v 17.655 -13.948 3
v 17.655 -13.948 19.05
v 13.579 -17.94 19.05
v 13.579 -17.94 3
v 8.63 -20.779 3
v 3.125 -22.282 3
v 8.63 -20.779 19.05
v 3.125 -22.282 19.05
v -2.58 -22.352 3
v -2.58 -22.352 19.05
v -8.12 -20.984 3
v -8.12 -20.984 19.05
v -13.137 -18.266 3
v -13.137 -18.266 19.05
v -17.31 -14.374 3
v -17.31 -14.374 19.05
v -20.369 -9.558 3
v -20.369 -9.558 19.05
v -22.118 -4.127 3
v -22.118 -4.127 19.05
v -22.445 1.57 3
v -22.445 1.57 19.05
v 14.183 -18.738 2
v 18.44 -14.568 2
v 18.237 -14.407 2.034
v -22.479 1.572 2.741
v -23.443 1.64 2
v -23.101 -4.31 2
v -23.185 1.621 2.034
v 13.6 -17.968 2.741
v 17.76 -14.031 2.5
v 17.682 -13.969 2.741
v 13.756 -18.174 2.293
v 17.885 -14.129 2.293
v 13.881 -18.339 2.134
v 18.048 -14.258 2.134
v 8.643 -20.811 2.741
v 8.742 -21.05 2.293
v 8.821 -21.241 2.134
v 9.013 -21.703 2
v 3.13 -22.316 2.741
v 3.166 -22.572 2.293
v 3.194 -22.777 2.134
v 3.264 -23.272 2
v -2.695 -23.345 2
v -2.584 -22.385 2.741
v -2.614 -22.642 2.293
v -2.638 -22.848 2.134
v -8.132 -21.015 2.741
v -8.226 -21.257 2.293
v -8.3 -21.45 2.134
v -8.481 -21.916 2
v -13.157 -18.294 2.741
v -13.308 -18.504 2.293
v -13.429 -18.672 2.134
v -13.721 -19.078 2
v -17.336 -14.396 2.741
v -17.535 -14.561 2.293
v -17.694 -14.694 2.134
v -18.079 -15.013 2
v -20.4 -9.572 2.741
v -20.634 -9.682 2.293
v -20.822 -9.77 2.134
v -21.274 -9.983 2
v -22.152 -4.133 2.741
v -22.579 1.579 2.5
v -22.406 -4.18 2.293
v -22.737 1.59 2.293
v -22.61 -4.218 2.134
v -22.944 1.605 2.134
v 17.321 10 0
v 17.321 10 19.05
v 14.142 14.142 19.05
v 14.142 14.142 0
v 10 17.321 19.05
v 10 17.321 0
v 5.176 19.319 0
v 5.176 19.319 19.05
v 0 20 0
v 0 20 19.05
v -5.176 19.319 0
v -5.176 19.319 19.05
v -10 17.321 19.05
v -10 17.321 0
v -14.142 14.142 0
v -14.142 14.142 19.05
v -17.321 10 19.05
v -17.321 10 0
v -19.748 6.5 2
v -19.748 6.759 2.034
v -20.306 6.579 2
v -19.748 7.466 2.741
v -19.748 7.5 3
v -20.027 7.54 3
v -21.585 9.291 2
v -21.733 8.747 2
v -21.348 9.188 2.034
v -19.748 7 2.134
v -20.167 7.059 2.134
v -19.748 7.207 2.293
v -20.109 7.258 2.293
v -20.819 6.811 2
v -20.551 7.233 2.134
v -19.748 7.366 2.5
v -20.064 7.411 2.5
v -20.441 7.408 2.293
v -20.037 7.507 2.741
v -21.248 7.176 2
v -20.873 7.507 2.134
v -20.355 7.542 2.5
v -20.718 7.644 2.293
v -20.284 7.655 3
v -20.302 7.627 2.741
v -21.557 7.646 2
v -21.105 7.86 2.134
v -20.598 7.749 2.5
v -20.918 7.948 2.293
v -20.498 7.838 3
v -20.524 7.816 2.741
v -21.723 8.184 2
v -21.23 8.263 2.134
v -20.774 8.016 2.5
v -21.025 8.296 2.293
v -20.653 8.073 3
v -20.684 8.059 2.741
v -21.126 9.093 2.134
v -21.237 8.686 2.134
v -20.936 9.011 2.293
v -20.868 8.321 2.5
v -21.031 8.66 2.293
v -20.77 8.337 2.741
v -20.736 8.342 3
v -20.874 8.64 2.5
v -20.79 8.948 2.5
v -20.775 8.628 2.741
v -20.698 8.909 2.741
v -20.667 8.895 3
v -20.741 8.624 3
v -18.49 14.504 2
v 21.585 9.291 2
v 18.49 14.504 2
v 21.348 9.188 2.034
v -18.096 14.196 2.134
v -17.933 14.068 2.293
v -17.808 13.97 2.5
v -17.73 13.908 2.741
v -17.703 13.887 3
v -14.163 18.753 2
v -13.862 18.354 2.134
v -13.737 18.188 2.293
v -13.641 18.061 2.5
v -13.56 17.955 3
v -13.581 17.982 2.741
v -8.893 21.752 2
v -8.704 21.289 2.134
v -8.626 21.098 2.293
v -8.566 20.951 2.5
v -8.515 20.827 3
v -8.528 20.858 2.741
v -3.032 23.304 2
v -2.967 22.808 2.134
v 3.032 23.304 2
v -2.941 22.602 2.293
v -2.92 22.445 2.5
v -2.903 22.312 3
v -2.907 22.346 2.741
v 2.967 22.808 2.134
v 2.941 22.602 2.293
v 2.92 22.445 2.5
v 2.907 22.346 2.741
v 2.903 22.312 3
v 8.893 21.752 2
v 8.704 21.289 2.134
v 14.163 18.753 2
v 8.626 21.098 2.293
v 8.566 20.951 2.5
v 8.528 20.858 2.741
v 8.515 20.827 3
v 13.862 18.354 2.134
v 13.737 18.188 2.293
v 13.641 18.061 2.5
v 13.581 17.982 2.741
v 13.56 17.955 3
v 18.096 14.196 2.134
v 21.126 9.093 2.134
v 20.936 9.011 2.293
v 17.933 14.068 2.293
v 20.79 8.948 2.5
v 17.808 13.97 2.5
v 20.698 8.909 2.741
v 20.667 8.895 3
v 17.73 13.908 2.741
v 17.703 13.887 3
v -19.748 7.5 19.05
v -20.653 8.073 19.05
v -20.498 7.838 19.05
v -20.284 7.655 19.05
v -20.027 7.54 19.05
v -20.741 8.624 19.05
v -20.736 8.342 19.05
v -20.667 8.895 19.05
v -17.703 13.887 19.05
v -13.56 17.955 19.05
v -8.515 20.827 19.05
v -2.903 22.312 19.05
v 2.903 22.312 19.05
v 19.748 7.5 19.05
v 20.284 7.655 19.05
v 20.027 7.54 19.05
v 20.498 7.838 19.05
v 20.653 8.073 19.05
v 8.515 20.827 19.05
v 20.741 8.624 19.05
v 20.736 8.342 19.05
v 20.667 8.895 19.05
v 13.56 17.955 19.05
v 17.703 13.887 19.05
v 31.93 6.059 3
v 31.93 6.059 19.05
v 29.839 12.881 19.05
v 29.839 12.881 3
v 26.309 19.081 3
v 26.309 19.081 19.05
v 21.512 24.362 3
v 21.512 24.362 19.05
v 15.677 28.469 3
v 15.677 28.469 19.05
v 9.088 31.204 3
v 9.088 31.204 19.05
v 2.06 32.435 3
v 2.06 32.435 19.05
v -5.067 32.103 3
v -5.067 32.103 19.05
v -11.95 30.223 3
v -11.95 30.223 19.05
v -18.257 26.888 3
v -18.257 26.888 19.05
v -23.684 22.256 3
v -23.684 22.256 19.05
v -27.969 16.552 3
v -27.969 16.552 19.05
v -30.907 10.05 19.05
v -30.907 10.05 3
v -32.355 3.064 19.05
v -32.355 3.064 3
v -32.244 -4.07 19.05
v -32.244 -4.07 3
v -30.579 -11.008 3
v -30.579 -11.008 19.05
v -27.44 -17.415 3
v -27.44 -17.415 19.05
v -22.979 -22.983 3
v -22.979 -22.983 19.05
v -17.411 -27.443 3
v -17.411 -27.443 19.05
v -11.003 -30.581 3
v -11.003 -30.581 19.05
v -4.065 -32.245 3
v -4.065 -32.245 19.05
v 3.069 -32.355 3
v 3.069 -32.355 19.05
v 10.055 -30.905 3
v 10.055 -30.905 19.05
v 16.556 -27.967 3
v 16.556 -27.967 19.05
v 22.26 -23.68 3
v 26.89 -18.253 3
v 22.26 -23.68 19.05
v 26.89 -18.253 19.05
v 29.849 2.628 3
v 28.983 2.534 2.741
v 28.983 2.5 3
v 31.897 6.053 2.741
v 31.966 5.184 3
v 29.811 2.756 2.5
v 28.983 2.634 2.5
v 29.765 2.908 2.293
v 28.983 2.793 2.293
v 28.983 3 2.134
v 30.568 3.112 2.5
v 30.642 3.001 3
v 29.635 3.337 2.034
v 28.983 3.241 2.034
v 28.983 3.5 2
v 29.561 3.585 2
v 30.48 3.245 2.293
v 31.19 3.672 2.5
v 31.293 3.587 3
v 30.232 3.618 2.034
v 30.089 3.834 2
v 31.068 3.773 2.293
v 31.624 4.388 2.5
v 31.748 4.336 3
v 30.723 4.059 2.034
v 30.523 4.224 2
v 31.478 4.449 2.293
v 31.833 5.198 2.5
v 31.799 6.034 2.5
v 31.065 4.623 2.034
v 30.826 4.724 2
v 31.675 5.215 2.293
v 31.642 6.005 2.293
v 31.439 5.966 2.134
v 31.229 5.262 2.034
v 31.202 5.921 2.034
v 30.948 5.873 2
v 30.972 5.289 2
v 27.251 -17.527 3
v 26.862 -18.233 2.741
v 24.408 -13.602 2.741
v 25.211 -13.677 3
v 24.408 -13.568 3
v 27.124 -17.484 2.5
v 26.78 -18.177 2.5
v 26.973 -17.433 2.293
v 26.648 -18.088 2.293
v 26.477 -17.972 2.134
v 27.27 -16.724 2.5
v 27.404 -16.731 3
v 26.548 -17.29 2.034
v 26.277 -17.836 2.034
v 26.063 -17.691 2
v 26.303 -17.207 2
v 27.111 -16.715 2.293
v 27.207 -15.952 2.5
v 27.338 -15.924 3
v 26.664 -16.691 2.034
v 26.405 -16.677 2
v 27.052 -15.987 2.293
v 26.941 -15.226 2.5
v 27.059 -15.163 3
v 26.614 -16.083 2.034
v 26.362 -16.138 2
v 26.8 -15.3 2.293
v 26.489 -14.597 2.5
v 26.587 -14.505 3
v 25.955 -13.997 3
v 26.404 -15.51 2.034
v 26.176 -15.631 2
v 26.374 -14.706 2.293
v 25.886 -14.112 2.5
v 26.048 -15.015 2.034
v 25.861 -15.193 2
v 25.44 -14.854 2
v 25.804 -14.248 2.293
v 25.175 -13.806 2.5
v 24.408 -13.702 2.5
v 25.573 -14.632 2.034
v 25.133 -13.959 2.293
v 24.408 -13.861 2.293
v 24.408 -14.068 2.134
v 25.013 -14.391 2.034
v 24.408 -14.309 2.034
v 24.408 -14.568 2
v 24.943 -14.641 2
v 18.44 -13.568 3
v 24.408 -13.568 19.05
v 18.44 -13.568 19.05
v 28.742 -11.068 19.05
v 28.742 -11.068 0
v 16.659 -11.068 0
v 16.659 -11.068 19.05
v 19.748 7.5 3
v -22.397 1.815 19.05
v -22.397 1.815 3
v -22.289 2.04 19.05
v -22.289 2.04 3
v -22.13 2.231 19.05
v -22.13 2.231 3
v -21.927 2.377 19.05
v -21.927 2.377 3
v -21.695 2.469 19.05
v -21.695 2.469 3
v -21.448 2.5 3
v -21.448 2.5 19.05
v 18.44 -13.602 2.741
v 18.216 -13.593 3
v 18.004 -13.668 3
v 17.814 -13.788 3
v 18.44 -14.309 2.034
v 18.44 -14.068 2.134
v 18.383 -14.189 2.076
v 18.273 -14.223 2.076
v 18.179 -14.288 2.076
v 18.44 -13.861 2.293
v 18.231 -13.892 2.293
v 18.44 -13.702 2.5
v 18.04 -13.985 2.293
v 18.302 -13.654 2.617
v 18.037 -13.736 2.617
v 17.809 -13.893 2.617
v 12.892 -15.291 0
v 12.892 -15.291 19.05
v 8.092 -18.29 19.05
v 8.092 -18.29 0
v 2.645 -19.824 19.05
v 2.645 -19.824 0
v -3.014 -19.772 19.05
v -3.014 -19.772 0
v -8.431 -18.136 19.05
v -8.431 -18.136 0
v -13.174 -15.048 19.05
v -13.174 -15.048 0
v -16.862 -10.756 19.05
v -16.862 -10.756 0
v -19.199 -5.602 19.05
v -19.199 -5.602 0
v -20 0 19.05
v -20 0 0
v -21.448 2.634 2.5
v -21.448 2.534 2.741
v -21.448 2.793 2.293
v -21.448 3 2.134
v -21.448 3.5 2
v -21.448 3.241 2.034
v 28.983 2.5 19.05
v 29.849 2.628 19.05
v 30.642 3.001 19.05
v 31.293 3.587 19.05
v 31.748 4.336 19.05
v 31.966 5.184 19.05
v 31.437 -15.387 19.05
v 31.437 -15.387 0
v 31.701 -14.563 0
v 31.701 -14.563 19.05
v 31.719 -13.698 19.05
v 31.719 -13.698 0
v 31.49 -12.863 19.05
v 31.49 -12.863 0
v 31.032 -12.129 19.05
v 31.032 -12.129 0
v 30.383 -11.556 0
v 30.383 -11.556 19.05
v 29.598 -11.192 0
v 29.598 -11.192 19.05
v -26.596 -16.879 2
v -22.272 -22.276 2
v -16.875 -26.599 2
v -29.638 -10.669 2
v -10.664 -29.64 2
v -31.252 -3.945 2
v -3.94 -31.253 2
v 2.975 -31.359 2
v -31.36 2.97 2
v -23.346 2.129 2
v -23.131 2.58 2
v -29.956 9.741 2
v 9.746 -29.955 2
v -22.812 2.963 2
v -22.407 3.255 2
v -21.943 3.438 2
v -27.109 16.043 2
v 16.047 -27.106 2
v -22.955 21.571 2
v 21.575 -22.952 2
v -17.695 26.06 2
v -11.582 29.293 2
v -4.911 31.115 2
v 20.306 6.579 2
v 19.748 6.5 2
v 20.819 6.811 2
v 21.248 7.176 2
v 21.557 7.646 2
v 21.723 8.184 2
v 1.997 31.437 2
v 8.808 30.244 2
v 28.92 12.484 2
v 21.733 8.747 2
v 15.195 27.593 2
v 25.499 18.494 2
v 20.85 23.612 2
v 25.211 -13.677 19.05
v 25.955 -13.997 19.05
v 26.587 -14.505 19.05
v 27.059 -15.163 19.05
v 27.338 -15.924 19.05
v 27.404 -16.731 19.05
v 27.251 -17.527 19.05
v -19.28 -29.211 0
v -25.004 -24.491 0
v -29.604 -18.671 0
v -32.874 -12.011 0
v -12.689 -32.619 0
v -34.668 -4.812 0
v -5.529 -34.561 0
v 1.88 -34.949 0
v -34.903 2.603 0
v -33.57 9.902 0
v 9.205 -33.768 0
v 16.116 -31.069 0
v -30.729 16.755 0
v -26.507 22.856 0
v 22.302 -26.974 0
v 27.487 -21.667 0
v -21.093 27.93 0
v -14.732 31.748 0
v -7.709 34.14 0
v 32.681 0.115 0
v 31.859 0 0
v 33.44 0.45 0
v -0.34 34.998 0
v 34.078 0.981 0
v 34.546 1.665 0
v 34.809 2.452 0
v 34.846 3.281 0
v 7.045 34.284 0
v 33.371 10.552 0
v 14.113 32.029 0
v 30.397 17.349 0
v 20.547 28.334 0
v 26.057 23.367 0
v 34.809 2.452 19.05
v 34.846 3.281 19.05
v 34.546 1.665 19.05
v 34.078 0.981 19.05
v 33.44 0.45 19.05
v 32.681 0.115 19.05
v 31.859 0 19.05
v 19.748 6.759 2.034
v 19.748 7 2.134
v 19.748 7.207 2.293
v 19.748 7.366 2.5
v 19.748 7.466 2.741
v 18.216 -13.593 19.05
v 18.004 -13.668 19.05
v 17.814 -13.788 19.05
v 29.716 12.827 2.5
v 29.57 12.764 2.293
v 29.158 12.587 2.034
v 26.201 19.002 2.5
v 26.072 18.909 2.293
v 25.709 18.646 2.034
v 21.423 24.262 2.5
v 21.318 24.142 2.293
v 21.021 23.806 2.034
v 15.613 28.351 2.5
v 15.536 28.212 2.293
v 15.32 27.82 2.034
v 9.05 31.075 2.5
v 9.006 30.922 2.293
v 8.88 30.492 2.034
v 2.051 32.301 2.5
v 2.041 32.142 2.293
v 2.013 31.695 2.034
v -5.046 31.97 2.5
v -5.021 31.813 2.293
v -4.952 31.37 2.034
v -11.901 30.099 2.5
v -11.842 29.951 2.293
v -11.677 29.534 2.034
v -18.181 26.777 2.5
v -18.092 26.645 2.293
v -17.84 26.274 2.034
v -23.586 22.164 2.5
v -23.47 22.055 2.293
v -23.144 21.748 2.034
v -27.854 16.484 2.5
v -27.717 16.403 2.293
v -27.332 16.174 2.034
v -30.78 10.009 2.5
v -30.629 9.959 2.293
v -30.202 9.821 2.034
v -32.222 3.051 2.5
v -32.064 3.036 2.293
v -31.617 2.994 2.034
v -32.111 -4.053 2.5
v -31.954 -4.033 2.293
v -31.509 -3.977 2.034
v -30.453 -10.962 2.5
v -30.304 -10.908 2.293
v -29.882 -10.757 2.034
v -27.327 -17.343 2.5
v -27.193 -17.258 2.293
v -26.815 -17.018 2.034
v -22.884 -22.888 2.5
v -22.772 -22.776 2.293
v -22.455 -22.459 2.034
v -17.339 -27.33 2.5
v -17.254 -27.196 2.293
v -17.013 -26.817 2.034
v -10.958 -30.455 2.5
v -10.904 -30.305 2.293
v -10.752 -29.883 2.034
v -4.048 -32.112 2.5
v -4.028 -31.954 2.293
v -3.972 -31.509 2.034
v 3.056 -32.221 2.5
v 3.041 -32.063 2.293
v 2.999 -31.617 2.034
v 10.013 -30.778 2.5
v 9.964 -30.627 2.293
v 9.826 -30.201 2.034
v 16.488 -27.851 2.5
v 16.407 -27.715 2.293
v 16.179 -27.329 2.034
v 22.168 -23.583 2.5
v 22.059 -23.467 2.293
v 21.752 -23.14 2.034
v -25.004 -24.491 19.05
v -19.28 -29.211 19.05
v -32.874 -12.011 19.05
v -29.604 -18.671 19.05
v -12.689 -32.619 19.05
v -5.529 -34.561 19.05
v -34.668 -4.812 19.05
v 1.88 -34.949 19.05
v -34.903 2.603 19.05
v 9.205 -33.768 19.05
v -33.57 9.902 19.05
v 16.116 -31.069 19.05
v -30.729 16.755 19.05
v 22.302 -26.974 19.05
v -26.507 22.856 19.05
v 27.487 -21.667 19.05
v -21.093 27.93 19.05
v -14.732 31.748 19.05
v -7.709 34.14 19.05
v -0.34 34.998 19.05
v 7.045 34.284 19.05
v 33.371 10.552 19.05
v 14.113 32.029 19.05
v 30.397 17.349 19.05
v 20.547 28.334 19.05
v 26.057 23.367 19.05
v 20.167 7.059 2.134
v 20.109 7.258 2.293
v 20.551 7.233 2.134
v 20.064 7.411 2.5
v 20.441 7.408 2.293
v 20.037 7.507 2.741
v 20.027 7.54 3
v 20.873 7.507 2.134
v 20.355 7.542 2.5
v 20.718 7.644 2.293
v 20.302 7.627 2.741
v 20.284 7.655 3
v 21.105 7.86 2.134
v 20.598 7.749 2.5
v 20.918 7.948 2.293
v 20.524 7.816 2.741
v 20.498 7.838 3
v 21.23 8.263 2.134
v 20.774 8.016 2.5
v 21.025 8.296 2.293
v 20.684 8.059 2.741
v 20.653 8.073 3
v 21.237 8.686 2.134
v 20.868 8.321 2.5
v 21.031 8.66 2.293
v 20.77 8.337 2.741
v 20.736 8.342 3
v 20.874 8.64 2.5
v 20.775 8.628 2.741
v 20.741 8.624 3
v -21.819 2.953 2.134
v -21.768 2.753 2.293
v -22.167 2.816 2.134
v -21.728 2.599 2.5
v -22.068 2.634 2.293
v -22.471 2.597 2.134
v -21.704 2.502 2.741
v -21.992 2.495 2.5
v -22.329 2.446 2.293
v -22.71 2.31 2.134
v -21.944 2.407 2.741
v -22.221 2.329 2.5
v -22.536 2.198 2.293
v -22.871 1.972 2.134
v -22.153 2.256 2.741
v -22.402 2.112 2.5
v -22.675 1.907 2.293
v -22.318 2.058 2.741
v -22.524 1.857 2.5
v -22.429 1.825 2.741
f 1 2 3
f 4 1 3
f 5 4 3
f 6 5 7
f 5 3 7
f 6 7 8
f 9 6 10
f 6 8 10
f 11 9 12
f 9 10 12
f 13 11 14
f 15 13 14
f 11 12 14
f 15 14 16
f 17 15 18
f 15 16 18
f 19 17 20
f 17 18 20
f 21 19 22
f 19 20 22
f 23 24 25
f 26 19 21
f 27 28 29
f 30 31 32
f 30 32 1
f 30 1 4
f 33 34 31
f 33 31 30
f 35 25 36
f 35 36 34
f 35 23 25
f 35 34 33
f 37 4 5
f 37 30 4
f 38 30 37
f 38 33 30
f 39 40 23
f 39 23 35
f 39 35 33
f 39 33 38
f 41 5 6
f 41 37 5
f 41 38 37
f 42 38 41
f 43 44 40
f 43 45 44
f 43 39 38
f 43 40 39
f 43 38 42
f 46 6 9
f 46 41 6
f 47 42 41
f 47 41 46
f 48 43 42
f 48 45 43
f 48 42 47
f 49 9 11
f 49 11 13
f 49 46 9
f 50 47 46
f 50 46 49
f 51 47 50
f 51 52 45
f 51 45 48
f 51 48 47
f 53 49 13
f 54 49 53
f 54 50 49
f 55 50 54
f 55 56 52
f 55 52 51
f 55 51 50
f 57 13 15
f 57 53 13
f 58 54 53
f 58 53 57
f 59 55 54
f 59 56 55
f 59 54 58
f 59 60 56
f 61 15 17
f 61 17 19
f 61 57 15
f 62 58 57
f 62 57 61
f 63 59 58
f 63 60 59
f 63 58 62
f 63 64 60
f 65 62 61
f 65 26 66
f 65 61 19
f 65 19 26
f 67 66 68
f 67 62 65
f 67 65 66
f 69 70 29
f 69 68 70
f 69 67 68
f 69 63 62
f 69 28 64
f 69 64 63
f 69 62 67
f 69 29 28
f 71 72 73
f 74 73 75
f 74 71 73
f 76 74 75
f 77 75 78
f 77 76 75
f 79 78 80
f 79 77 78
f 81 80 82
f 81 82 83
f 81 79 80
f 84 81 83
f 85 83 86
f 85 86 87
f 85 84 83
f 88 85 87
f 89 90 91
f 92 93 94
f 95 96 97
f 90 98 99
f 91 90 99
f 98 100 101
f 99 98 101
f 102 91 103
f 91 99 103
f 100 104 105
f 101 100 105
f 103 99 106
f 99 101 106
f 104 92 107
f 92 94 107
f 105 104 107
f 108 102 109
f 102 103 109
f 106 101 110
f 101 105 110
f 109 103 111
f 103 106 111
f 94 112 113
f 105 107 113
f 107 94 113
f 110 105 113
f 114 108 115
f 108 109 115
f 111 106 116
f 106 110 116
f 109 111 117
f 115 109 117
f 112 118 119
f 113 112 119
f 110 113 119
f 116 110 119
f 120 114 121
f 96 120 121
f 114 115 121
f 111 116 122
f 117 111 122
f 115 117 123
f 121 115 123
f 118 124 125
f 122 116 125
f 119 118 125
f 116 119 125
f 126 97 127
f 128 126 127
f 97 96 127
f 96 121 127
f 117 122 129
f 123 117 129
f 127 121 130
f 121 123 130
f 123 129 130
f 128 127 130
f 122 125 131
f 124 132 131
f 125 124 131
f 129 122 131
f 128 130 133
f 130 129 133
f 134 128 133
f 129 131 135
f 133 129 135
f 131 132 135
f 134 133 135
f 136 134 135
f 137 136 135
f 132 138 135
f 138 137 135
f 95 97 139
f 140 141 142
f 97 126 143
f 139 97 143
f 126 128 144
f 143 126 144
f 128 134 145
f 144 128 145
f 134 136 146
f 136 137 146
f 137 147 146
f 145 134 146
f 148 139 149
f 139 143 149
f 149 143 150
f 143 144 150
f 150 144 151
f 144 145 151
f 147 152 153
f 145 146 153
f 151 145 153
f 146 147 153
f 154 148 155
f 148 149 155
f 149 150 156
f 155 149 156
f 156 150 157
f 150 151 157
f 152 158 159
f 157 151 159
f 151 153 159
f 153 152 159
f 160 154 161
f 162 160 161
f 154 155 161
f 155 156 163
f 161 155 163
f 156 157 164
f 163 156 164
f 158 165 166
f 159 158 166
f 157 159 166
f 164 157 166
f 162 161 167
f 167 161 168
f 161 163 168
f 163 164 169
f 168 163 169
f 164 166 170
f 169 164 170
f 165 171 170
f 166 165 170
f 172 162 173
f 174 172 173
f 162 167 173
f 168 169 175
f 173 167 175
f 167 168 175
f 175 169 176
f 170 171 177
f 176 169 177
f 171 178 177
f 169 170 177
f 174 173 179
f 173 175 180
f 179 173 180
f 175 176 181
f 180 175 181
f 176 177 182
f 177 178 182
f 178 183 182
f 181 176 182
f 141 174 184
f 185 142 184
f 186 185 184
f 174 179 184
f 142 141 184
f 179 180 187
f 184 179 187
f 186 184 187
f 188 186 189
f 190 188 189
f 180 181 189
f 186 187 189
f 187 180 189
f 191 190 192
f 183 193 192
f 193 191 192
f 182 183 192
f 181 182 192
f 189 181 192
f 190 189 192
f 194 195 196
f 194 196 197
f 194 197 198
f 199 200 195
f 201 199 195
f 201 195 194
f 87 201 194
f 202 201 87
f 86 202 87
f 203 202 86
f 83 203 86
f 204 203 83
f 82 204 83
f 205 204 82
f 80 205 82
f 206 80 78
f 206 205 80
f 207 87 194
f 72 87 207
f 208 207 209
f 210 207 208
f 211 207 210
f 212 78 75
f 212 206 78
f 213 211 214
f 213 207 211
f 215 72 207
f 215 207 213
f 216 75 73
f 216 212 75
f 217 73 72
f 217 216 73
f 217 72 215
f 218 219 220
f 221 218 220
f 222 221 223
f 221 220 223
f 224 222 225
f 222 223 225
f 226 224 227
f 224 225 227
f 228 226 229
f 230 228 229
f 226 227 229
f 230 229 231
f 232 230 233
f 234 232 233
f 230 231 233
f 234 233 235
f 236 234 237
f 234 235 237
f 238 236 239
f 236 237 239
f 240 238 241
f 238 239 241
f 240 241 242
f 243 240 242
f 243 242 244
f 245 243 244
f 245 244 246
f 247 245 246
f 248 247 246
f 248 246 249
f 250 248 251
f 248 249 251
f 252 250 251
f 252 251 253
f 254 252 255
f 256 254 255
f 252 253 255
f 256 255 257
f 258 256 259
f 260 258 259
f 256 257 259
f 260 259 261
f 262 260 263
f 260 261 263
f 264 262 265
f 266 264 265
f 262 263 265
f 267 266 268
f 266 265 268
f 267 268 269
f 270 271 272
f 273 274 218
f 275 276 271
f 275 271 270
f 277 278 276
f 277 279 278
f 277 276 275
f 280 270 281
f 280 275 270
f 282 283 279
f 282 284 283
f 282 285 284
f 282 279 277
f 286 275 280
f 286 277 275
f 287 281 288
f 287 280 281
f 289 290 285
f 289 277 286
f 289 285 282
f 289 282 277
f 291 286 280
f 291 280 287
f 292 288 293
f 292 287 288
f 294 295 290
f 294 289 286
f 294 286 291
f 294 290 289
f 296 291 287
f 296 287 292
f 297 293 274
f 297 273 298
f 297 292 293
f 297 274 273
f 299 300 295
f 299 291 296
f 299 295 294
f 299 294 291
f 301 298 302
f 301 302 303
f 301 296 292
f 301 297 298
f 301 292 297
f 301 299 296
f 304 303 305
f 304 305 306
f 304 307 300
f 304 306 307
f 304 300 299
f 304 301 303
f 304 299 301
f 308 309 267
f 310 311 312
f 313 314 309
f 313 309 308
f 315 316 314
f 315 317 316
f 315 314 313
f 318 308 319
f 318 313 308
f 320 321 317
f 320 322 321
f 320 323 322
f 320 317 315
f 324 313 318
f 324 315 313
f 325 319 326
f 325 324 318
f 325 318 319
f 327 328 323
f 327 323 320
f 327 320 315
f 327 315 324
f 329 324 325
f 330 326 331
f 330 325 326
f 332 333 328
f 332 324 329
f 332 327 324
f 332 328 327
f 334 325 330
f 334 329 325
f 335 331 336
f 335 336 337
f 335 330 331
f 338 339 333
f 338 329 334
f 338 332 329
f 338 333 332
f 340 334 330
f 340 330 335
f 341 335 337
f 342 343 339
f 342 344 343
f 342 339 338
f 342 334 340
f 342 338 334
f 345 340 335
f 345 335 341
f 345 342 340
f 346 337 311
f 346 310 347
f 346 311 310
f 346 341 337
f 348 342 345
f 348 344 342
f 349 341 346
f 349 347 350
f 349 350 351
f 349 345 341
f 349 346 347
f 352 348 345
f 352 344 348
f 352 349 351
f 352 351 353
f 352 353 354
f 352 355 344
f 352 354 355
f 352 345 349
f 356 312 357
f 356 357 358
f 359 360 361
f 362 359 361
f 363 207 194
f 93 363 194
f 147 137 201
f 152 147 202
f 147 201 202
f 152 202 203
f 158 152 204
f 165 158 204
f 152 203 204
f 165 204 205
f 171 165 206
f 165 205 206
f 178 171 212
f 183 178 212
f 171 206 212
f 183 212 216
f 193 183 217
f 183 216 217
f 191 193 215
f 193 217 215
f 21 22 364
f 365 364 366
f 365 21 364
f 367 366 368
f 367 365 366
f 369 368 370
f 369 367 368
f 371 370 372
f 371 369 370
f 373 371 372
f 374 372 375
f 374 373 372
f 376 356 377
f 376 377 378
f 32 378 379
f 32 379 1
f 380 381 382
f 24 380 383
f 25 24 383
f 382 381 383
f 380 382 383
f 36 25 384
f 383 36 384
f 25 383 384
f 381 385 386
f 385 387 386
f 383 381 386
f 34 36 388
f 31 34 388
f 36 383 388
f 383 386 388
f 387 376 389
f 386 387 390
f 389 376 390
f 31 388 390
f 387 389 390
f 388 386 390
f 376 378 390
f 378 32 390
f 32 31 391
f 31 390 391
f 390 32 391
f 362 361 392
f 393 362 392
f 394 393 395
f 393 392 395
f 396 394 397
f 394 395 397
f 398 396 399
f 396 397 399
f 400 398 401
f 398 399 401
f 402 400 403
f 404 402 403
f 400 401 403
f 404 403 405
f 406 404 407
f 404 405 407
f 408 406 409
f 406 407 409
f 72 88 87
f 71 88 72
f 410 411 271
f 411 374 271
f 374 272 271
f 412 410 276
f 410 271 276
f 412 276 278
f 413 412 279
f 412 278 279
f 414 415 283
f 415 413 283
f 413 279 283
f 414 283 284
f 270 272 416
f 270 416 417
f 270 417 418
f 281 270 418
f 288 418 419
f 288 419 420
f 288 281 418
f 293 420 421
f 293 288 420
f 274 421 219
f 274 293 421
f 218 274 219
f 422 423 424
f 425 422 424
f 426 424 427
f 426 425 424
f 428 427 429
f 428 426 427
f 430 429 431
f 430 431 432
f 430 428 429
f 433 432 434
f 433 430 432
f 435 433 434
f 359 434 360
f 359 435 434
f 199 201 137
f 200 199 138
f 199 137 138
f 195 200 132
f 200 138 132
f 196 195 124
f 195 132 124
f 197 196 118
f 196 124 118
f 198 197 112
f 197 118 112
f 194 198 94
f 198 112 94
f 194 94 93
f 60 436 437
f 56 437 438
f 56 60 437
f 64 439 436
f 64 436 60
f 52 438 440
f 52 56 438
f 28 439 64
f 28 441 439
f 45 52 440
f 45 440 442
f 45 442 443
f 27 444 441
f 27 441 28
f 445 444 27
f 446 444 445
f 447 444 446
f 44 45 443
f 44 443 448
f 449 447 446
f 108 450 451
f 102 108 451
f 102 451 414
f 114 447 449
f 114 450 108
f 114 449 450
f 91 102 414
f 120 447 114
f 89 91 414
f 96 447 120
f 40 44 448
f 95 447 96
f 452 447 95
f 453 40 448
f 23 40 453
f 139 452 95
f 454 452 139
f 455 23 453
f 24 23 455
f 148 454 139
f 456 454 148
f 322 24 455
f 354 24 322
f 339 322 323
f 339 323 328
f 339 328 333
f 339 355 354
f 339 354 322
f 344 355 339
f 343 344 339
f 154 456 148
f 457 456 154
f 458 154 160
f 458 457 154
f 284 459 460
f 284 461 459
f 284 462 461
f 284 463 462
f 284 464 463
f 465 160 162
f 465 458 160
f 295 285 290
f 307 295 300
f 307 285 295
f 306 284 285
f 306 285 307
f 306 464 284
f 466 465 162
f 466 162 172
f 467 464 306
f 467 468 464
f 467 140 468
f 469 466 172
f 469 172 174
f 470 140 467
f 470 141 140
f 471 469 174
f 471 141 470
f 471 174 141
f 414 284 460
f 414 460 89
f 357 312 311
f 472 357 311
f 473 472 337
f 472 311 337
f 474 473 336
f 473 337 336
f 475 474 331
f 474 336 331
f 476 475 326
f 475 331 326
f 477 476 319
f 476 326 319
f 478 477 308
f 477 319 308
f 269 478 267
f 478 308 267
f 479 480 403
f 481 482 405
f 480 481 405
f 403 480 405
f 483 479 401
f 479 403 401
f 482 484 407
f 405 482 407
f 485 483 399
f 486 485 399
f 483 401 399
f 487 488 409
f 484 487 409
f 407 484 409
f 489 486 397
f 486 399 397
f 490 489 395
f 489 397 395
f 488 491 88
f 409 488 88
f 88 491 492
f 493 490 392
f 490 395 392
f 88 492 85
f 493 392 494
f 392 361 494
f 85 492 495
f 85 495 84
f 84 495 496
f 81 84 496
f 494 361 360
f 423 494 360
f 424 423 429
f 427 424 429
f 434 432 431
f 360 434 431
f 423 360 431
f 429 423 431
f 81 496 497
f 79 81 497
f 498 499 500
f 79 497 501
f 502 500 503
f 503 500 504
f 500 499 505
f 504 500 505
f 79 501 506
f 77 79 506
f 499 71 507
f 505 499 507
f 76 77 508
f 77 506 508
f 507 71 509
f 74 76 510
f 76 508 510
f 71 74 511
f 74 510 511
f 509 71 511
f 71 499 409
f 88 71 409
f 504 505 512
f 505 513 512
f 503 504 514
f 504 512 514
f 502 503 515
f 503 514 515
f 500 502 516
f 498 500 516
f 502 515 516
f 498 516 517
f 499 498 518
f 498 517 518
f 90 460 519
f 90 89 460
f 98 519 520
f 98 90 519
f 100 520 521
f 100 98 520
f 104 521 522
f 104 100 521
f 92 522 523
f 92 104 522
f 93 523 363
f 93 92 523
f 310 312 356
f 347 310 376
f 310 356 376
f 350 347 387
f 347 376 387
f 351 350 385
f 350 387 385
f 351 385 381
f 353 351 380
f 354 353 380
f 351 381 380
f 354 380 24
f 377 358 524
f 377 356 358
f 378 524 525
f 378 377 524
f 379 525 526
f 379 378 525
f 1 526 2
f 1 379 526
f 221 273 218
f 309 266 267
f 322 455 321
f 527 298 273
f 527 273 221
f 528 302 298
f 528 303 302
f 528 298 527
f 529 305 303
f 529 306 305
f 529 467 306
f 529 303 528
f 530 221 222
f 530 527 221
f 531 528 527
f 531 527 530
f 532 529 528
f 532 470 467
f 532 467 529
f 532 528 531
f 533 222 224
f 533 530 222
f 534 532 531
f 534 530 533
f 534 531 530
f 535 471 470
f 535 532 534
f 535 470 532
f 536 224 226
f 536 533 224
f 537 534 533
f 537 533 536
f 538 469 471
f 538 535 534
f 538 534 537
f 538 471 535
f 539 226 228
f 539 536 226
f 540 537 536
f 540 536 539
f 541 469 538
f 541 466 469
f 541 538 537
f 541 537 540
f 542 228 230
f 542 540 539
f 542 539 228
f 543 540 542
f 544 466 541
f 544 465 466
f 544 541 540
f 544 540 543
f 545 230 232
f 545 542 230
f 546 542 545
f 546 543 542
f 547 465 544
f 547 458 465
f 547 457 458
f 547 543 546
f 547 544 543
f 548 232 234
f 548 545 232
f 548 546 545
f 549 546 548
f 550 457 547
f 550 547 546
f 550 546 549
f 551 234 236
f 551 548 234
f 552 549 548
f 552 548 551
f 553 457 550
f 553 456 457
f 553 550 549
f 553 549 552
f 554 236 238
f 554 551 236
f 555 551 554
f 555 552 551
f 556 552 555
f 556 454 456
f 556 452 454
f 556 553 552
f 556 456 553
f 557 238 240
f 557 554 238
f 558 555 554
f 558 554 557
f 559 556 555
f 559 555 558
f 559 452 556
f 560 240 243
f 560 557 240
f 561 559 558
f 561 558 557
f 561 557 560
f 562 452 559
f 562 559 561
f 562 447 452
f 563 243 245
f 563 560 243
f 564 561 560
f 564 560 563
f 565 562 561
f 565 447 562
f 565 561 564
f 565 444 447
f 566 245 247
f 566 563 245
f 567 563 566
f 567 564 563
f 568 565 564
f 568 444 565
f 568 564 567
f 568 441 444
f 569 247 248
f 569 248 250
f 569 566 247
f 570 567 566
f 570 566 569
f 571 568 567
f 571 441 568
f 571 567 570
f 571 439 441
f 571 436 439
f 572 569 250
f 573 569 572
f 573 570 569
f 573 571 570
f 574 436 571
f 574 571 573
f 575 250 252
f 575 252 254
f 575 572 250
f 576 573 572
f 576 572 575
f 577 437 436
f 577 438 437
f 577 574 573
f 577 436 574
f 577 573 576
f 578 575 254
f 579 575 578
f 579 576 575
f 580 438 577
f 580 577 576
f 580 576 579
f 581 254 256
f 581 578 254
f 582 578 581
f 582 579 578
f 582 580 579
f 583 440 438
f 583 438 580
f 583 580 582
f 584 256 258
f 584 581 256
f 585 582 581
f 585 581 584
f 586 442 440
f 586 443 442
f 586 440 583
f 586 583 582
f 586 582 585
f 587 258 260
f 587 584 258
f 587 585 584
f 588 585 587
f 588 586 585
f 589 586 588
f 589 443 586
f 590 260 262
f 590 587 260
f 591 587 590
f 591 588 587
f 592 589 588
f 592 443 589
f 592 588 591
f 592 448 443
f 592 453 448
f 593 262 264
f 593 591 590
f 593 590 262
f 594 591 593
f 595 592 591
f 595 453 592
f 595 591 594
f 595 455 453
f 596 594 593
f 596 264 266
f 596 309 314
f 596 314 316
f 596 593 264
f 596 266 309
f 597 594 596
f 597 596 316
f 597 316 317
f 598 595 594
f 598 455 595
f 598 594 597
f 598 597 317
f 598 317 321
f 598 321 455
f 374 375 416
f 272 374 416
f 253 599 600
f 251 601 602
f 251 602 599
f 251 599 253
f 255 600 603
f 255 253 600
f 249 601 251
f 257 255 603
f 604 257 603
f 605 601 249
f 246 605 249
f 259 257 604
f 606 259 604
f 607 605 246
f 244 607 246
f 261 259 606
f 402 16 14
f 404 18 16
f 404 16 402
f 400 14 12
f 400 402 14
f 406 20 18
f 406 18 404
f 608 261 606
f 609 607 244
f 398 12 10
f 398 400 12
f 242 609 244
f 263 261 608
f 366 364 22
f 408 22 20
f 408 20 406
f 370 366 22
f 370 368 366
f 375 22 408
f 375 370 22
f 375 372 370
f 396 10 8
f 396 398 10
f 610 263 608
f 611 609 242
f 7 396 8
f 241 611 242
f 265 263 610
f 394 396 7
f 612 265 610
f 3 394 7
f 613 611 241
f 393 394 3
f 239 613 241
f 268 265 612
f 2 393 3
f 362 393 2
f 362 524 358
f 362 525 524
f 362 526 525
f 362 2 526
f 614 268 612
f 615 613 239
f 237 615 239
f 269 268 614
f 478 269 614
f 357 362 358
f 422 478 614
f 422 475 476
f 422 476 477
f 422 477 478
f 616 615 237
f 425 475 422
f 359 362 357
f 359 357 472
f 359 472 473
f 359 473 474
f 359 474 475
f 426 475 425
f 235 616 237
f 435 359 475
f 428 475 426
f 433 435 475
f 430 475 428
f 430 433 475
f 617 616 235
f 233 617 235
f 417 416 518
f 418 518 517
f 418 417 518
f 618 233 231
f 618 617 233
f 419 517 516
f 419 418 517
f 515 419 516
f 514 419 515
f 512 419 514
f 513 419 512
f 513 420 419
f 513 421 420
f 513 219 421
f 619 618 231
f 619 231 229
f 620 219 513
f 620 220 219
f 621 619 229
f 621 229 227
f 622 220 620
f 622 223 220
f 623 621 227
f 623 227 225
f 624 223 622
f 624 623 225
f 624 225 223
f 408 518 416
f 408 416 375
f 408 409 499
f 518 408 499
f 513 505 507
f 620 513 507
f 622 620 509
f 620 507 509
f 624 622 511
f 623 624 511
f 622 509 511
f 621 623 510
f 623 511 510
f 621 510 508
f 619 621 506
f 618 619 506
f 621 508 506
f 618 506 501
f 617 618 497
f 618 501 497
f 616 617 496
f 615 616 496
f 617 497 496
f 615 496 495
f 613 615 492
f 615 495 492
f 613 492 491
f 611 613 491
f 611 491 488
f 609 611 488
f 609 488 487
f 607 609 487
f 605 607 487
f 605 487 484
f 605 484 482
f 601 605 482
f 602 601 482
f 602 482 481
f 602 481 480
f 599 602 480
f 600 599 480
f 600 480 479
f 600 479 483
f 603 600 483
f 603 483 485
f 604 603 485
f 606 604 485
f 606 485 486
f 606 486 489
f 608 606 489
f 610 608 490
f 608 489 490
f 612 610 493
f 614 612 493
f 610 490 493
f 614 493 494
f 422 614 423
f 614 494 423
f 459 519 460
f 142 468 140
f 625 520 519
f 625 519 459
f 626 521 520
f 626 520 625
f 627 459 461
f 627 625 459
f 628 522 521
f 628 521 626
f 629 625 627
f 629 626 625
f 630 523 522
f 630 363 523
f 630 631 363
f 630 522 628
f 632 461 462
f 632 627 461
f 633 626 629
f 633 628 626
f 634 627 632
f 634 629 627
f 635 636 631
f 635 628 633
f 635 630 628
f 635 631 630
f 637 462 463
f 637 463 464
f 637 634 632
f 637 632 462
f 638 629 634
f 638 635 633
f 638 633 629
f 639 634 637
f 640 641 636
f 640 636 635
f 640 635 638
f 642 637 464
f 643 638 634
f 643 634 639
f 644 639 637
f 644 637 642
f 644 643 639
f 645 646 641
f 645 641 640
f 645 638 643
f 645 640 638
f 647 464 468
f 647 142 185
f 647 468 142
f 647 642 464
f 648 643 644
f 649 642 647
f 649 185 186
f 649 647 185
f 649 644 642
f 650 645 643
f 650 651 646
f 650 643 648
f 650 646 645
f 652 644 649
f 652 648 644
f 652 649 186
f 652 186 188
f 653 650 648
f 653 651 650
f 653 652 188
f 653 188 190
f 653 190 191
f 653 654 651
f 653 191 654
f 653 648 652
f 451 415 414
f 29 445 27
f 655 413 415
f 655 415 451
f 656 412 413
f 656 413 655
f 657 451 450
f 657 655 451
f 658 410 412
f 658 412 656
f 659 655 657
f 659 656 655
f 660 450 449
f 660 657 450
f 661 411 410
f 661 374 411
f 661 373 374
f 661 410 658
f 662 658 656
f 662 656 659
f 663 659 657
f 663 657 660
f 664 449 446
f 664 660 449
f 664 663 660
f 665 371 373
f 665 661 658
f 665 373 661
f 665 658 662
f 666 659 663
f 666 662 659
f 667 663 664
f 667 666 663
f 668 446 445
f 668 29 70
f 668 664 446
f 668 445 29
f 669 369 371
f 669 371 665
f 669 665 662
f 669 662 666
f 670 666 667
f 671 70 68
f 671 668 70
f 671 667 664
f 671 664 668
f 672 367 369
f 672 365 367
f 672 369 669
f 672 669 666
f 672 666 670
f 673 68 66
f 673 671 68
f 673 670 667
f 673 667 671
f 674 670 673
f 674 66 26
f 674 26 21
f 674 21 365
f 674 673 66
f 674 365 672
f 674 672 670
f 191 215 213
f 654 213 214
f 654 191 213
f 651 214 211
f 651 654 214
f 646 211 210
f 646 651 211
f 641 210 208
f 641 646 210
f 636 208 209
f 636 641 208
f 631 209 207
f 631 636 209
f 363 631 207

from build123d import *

# Parameters (mm, degrees)
BOSS_EXTRUDE6_DEPTH = 19.05
CUT_EXTRUDE2_DEPTH  = 17.05
FILLET2_R           = 3
FILLET1_R           = 1


with BuildPart() as part:
    # Sketch3 → Boss-Extrude6 (new body)
    with BuildSketch(Plane.XY):
        with BuildLine():
            Line((0, 0), (35, 0))
            ThreePointArc((35, 0), (-34.548087395, 5.606215958), (33.204019579, -11.067659364))
            Line((33.204019579, -11.067659364), (16.658538837, -11.067659364))
            ThreePointArc((16.658538837, -11.067659364), (-5.780537313, -19.146419727), (-20, 0))
            Line((-20, 0), (0, 0))
        make_face()
        with BuildLine():
            Line((-17.320508076, 10), (17.320508076, 10))
            ThreePointArc((17.320508076, 10), (0, 20), (-17.320508076, 10))
        make_face(mode=Mode.SUBTRACT)
    extrude(amount=BOSS_EXTRUDE6_DEPTH)

    # Sketch6 → Cut-Extrude2 (cut)
    with BuildSketch(Plane.XY.offset(19.05)):
        with BuildLine():
            Line((29.532501069, -13.567659364), (17.949056225, -13.567659364))
            ThreePointArc((17.949056225, -13.567659364), (-8.331147877, -20.900764939), (-22.360679775, 2.5))
            Line((-22.360679775, 2.5), (20, 2.5))
            Line((20, 2.5), (32.403703492, 2.5))
            ThreePointArc((32.403703492, 2.5), (-31.993214565, 5.717011614), (29.532501069, -13.567659364))
        make_face()
        with BuildLine():
            Line((21.213203436, 7.5), (-21.213203436, 7.5))
            ThreePointArc((-21.213203436, 7.5), (0, 22.5), (21.213203436, 7.5))
        make_face(mode=Mode.SUBTRACT)
    extrude(amount=-CUT_EXTRUDE2_DEPTH, mode=Mode.SUBTRACT)

    # Fillet2
    fillet2_edges = [part.edges().sort_by_distance(p)[0] for p in [
        (29.532501069, -13.567659364, 10.525),
        (32.403703492, 2.5, 10.525),
        (33.204019579, -11.067659364, 9.525),
        (35, 0, 9.525),
    ]]
    fillet(fillet2_edges, radius=FILLET2_R)

    # Fillet1
    fillet1_edges = [part.edges().sort_by_distance(p)[0] for p in [
        (3.311036859, 2.5, 2),
        (-8.331147877, -20.900764939, 2),
        (-22.360679775, 2.5, 10.525),
        (17.949056225, -13.567659364, 10.525),
        (0, 7.5, 2),
        (0, 22.5, 2),
        (21.213203436, 7.5, 10.525),
        (-21.213203436, 7.5, 10.525),
        (-31.823448952, 6.596824754, 2),
        (21.178653063, -13.567659364, 2),
        (27.059149761, -15.16312032, 2),
        (31.293377445, 3.586621588, 2),
    ]]
    fillet(fillet1_edges, radius=FILLET1_R)


solid = part.part
